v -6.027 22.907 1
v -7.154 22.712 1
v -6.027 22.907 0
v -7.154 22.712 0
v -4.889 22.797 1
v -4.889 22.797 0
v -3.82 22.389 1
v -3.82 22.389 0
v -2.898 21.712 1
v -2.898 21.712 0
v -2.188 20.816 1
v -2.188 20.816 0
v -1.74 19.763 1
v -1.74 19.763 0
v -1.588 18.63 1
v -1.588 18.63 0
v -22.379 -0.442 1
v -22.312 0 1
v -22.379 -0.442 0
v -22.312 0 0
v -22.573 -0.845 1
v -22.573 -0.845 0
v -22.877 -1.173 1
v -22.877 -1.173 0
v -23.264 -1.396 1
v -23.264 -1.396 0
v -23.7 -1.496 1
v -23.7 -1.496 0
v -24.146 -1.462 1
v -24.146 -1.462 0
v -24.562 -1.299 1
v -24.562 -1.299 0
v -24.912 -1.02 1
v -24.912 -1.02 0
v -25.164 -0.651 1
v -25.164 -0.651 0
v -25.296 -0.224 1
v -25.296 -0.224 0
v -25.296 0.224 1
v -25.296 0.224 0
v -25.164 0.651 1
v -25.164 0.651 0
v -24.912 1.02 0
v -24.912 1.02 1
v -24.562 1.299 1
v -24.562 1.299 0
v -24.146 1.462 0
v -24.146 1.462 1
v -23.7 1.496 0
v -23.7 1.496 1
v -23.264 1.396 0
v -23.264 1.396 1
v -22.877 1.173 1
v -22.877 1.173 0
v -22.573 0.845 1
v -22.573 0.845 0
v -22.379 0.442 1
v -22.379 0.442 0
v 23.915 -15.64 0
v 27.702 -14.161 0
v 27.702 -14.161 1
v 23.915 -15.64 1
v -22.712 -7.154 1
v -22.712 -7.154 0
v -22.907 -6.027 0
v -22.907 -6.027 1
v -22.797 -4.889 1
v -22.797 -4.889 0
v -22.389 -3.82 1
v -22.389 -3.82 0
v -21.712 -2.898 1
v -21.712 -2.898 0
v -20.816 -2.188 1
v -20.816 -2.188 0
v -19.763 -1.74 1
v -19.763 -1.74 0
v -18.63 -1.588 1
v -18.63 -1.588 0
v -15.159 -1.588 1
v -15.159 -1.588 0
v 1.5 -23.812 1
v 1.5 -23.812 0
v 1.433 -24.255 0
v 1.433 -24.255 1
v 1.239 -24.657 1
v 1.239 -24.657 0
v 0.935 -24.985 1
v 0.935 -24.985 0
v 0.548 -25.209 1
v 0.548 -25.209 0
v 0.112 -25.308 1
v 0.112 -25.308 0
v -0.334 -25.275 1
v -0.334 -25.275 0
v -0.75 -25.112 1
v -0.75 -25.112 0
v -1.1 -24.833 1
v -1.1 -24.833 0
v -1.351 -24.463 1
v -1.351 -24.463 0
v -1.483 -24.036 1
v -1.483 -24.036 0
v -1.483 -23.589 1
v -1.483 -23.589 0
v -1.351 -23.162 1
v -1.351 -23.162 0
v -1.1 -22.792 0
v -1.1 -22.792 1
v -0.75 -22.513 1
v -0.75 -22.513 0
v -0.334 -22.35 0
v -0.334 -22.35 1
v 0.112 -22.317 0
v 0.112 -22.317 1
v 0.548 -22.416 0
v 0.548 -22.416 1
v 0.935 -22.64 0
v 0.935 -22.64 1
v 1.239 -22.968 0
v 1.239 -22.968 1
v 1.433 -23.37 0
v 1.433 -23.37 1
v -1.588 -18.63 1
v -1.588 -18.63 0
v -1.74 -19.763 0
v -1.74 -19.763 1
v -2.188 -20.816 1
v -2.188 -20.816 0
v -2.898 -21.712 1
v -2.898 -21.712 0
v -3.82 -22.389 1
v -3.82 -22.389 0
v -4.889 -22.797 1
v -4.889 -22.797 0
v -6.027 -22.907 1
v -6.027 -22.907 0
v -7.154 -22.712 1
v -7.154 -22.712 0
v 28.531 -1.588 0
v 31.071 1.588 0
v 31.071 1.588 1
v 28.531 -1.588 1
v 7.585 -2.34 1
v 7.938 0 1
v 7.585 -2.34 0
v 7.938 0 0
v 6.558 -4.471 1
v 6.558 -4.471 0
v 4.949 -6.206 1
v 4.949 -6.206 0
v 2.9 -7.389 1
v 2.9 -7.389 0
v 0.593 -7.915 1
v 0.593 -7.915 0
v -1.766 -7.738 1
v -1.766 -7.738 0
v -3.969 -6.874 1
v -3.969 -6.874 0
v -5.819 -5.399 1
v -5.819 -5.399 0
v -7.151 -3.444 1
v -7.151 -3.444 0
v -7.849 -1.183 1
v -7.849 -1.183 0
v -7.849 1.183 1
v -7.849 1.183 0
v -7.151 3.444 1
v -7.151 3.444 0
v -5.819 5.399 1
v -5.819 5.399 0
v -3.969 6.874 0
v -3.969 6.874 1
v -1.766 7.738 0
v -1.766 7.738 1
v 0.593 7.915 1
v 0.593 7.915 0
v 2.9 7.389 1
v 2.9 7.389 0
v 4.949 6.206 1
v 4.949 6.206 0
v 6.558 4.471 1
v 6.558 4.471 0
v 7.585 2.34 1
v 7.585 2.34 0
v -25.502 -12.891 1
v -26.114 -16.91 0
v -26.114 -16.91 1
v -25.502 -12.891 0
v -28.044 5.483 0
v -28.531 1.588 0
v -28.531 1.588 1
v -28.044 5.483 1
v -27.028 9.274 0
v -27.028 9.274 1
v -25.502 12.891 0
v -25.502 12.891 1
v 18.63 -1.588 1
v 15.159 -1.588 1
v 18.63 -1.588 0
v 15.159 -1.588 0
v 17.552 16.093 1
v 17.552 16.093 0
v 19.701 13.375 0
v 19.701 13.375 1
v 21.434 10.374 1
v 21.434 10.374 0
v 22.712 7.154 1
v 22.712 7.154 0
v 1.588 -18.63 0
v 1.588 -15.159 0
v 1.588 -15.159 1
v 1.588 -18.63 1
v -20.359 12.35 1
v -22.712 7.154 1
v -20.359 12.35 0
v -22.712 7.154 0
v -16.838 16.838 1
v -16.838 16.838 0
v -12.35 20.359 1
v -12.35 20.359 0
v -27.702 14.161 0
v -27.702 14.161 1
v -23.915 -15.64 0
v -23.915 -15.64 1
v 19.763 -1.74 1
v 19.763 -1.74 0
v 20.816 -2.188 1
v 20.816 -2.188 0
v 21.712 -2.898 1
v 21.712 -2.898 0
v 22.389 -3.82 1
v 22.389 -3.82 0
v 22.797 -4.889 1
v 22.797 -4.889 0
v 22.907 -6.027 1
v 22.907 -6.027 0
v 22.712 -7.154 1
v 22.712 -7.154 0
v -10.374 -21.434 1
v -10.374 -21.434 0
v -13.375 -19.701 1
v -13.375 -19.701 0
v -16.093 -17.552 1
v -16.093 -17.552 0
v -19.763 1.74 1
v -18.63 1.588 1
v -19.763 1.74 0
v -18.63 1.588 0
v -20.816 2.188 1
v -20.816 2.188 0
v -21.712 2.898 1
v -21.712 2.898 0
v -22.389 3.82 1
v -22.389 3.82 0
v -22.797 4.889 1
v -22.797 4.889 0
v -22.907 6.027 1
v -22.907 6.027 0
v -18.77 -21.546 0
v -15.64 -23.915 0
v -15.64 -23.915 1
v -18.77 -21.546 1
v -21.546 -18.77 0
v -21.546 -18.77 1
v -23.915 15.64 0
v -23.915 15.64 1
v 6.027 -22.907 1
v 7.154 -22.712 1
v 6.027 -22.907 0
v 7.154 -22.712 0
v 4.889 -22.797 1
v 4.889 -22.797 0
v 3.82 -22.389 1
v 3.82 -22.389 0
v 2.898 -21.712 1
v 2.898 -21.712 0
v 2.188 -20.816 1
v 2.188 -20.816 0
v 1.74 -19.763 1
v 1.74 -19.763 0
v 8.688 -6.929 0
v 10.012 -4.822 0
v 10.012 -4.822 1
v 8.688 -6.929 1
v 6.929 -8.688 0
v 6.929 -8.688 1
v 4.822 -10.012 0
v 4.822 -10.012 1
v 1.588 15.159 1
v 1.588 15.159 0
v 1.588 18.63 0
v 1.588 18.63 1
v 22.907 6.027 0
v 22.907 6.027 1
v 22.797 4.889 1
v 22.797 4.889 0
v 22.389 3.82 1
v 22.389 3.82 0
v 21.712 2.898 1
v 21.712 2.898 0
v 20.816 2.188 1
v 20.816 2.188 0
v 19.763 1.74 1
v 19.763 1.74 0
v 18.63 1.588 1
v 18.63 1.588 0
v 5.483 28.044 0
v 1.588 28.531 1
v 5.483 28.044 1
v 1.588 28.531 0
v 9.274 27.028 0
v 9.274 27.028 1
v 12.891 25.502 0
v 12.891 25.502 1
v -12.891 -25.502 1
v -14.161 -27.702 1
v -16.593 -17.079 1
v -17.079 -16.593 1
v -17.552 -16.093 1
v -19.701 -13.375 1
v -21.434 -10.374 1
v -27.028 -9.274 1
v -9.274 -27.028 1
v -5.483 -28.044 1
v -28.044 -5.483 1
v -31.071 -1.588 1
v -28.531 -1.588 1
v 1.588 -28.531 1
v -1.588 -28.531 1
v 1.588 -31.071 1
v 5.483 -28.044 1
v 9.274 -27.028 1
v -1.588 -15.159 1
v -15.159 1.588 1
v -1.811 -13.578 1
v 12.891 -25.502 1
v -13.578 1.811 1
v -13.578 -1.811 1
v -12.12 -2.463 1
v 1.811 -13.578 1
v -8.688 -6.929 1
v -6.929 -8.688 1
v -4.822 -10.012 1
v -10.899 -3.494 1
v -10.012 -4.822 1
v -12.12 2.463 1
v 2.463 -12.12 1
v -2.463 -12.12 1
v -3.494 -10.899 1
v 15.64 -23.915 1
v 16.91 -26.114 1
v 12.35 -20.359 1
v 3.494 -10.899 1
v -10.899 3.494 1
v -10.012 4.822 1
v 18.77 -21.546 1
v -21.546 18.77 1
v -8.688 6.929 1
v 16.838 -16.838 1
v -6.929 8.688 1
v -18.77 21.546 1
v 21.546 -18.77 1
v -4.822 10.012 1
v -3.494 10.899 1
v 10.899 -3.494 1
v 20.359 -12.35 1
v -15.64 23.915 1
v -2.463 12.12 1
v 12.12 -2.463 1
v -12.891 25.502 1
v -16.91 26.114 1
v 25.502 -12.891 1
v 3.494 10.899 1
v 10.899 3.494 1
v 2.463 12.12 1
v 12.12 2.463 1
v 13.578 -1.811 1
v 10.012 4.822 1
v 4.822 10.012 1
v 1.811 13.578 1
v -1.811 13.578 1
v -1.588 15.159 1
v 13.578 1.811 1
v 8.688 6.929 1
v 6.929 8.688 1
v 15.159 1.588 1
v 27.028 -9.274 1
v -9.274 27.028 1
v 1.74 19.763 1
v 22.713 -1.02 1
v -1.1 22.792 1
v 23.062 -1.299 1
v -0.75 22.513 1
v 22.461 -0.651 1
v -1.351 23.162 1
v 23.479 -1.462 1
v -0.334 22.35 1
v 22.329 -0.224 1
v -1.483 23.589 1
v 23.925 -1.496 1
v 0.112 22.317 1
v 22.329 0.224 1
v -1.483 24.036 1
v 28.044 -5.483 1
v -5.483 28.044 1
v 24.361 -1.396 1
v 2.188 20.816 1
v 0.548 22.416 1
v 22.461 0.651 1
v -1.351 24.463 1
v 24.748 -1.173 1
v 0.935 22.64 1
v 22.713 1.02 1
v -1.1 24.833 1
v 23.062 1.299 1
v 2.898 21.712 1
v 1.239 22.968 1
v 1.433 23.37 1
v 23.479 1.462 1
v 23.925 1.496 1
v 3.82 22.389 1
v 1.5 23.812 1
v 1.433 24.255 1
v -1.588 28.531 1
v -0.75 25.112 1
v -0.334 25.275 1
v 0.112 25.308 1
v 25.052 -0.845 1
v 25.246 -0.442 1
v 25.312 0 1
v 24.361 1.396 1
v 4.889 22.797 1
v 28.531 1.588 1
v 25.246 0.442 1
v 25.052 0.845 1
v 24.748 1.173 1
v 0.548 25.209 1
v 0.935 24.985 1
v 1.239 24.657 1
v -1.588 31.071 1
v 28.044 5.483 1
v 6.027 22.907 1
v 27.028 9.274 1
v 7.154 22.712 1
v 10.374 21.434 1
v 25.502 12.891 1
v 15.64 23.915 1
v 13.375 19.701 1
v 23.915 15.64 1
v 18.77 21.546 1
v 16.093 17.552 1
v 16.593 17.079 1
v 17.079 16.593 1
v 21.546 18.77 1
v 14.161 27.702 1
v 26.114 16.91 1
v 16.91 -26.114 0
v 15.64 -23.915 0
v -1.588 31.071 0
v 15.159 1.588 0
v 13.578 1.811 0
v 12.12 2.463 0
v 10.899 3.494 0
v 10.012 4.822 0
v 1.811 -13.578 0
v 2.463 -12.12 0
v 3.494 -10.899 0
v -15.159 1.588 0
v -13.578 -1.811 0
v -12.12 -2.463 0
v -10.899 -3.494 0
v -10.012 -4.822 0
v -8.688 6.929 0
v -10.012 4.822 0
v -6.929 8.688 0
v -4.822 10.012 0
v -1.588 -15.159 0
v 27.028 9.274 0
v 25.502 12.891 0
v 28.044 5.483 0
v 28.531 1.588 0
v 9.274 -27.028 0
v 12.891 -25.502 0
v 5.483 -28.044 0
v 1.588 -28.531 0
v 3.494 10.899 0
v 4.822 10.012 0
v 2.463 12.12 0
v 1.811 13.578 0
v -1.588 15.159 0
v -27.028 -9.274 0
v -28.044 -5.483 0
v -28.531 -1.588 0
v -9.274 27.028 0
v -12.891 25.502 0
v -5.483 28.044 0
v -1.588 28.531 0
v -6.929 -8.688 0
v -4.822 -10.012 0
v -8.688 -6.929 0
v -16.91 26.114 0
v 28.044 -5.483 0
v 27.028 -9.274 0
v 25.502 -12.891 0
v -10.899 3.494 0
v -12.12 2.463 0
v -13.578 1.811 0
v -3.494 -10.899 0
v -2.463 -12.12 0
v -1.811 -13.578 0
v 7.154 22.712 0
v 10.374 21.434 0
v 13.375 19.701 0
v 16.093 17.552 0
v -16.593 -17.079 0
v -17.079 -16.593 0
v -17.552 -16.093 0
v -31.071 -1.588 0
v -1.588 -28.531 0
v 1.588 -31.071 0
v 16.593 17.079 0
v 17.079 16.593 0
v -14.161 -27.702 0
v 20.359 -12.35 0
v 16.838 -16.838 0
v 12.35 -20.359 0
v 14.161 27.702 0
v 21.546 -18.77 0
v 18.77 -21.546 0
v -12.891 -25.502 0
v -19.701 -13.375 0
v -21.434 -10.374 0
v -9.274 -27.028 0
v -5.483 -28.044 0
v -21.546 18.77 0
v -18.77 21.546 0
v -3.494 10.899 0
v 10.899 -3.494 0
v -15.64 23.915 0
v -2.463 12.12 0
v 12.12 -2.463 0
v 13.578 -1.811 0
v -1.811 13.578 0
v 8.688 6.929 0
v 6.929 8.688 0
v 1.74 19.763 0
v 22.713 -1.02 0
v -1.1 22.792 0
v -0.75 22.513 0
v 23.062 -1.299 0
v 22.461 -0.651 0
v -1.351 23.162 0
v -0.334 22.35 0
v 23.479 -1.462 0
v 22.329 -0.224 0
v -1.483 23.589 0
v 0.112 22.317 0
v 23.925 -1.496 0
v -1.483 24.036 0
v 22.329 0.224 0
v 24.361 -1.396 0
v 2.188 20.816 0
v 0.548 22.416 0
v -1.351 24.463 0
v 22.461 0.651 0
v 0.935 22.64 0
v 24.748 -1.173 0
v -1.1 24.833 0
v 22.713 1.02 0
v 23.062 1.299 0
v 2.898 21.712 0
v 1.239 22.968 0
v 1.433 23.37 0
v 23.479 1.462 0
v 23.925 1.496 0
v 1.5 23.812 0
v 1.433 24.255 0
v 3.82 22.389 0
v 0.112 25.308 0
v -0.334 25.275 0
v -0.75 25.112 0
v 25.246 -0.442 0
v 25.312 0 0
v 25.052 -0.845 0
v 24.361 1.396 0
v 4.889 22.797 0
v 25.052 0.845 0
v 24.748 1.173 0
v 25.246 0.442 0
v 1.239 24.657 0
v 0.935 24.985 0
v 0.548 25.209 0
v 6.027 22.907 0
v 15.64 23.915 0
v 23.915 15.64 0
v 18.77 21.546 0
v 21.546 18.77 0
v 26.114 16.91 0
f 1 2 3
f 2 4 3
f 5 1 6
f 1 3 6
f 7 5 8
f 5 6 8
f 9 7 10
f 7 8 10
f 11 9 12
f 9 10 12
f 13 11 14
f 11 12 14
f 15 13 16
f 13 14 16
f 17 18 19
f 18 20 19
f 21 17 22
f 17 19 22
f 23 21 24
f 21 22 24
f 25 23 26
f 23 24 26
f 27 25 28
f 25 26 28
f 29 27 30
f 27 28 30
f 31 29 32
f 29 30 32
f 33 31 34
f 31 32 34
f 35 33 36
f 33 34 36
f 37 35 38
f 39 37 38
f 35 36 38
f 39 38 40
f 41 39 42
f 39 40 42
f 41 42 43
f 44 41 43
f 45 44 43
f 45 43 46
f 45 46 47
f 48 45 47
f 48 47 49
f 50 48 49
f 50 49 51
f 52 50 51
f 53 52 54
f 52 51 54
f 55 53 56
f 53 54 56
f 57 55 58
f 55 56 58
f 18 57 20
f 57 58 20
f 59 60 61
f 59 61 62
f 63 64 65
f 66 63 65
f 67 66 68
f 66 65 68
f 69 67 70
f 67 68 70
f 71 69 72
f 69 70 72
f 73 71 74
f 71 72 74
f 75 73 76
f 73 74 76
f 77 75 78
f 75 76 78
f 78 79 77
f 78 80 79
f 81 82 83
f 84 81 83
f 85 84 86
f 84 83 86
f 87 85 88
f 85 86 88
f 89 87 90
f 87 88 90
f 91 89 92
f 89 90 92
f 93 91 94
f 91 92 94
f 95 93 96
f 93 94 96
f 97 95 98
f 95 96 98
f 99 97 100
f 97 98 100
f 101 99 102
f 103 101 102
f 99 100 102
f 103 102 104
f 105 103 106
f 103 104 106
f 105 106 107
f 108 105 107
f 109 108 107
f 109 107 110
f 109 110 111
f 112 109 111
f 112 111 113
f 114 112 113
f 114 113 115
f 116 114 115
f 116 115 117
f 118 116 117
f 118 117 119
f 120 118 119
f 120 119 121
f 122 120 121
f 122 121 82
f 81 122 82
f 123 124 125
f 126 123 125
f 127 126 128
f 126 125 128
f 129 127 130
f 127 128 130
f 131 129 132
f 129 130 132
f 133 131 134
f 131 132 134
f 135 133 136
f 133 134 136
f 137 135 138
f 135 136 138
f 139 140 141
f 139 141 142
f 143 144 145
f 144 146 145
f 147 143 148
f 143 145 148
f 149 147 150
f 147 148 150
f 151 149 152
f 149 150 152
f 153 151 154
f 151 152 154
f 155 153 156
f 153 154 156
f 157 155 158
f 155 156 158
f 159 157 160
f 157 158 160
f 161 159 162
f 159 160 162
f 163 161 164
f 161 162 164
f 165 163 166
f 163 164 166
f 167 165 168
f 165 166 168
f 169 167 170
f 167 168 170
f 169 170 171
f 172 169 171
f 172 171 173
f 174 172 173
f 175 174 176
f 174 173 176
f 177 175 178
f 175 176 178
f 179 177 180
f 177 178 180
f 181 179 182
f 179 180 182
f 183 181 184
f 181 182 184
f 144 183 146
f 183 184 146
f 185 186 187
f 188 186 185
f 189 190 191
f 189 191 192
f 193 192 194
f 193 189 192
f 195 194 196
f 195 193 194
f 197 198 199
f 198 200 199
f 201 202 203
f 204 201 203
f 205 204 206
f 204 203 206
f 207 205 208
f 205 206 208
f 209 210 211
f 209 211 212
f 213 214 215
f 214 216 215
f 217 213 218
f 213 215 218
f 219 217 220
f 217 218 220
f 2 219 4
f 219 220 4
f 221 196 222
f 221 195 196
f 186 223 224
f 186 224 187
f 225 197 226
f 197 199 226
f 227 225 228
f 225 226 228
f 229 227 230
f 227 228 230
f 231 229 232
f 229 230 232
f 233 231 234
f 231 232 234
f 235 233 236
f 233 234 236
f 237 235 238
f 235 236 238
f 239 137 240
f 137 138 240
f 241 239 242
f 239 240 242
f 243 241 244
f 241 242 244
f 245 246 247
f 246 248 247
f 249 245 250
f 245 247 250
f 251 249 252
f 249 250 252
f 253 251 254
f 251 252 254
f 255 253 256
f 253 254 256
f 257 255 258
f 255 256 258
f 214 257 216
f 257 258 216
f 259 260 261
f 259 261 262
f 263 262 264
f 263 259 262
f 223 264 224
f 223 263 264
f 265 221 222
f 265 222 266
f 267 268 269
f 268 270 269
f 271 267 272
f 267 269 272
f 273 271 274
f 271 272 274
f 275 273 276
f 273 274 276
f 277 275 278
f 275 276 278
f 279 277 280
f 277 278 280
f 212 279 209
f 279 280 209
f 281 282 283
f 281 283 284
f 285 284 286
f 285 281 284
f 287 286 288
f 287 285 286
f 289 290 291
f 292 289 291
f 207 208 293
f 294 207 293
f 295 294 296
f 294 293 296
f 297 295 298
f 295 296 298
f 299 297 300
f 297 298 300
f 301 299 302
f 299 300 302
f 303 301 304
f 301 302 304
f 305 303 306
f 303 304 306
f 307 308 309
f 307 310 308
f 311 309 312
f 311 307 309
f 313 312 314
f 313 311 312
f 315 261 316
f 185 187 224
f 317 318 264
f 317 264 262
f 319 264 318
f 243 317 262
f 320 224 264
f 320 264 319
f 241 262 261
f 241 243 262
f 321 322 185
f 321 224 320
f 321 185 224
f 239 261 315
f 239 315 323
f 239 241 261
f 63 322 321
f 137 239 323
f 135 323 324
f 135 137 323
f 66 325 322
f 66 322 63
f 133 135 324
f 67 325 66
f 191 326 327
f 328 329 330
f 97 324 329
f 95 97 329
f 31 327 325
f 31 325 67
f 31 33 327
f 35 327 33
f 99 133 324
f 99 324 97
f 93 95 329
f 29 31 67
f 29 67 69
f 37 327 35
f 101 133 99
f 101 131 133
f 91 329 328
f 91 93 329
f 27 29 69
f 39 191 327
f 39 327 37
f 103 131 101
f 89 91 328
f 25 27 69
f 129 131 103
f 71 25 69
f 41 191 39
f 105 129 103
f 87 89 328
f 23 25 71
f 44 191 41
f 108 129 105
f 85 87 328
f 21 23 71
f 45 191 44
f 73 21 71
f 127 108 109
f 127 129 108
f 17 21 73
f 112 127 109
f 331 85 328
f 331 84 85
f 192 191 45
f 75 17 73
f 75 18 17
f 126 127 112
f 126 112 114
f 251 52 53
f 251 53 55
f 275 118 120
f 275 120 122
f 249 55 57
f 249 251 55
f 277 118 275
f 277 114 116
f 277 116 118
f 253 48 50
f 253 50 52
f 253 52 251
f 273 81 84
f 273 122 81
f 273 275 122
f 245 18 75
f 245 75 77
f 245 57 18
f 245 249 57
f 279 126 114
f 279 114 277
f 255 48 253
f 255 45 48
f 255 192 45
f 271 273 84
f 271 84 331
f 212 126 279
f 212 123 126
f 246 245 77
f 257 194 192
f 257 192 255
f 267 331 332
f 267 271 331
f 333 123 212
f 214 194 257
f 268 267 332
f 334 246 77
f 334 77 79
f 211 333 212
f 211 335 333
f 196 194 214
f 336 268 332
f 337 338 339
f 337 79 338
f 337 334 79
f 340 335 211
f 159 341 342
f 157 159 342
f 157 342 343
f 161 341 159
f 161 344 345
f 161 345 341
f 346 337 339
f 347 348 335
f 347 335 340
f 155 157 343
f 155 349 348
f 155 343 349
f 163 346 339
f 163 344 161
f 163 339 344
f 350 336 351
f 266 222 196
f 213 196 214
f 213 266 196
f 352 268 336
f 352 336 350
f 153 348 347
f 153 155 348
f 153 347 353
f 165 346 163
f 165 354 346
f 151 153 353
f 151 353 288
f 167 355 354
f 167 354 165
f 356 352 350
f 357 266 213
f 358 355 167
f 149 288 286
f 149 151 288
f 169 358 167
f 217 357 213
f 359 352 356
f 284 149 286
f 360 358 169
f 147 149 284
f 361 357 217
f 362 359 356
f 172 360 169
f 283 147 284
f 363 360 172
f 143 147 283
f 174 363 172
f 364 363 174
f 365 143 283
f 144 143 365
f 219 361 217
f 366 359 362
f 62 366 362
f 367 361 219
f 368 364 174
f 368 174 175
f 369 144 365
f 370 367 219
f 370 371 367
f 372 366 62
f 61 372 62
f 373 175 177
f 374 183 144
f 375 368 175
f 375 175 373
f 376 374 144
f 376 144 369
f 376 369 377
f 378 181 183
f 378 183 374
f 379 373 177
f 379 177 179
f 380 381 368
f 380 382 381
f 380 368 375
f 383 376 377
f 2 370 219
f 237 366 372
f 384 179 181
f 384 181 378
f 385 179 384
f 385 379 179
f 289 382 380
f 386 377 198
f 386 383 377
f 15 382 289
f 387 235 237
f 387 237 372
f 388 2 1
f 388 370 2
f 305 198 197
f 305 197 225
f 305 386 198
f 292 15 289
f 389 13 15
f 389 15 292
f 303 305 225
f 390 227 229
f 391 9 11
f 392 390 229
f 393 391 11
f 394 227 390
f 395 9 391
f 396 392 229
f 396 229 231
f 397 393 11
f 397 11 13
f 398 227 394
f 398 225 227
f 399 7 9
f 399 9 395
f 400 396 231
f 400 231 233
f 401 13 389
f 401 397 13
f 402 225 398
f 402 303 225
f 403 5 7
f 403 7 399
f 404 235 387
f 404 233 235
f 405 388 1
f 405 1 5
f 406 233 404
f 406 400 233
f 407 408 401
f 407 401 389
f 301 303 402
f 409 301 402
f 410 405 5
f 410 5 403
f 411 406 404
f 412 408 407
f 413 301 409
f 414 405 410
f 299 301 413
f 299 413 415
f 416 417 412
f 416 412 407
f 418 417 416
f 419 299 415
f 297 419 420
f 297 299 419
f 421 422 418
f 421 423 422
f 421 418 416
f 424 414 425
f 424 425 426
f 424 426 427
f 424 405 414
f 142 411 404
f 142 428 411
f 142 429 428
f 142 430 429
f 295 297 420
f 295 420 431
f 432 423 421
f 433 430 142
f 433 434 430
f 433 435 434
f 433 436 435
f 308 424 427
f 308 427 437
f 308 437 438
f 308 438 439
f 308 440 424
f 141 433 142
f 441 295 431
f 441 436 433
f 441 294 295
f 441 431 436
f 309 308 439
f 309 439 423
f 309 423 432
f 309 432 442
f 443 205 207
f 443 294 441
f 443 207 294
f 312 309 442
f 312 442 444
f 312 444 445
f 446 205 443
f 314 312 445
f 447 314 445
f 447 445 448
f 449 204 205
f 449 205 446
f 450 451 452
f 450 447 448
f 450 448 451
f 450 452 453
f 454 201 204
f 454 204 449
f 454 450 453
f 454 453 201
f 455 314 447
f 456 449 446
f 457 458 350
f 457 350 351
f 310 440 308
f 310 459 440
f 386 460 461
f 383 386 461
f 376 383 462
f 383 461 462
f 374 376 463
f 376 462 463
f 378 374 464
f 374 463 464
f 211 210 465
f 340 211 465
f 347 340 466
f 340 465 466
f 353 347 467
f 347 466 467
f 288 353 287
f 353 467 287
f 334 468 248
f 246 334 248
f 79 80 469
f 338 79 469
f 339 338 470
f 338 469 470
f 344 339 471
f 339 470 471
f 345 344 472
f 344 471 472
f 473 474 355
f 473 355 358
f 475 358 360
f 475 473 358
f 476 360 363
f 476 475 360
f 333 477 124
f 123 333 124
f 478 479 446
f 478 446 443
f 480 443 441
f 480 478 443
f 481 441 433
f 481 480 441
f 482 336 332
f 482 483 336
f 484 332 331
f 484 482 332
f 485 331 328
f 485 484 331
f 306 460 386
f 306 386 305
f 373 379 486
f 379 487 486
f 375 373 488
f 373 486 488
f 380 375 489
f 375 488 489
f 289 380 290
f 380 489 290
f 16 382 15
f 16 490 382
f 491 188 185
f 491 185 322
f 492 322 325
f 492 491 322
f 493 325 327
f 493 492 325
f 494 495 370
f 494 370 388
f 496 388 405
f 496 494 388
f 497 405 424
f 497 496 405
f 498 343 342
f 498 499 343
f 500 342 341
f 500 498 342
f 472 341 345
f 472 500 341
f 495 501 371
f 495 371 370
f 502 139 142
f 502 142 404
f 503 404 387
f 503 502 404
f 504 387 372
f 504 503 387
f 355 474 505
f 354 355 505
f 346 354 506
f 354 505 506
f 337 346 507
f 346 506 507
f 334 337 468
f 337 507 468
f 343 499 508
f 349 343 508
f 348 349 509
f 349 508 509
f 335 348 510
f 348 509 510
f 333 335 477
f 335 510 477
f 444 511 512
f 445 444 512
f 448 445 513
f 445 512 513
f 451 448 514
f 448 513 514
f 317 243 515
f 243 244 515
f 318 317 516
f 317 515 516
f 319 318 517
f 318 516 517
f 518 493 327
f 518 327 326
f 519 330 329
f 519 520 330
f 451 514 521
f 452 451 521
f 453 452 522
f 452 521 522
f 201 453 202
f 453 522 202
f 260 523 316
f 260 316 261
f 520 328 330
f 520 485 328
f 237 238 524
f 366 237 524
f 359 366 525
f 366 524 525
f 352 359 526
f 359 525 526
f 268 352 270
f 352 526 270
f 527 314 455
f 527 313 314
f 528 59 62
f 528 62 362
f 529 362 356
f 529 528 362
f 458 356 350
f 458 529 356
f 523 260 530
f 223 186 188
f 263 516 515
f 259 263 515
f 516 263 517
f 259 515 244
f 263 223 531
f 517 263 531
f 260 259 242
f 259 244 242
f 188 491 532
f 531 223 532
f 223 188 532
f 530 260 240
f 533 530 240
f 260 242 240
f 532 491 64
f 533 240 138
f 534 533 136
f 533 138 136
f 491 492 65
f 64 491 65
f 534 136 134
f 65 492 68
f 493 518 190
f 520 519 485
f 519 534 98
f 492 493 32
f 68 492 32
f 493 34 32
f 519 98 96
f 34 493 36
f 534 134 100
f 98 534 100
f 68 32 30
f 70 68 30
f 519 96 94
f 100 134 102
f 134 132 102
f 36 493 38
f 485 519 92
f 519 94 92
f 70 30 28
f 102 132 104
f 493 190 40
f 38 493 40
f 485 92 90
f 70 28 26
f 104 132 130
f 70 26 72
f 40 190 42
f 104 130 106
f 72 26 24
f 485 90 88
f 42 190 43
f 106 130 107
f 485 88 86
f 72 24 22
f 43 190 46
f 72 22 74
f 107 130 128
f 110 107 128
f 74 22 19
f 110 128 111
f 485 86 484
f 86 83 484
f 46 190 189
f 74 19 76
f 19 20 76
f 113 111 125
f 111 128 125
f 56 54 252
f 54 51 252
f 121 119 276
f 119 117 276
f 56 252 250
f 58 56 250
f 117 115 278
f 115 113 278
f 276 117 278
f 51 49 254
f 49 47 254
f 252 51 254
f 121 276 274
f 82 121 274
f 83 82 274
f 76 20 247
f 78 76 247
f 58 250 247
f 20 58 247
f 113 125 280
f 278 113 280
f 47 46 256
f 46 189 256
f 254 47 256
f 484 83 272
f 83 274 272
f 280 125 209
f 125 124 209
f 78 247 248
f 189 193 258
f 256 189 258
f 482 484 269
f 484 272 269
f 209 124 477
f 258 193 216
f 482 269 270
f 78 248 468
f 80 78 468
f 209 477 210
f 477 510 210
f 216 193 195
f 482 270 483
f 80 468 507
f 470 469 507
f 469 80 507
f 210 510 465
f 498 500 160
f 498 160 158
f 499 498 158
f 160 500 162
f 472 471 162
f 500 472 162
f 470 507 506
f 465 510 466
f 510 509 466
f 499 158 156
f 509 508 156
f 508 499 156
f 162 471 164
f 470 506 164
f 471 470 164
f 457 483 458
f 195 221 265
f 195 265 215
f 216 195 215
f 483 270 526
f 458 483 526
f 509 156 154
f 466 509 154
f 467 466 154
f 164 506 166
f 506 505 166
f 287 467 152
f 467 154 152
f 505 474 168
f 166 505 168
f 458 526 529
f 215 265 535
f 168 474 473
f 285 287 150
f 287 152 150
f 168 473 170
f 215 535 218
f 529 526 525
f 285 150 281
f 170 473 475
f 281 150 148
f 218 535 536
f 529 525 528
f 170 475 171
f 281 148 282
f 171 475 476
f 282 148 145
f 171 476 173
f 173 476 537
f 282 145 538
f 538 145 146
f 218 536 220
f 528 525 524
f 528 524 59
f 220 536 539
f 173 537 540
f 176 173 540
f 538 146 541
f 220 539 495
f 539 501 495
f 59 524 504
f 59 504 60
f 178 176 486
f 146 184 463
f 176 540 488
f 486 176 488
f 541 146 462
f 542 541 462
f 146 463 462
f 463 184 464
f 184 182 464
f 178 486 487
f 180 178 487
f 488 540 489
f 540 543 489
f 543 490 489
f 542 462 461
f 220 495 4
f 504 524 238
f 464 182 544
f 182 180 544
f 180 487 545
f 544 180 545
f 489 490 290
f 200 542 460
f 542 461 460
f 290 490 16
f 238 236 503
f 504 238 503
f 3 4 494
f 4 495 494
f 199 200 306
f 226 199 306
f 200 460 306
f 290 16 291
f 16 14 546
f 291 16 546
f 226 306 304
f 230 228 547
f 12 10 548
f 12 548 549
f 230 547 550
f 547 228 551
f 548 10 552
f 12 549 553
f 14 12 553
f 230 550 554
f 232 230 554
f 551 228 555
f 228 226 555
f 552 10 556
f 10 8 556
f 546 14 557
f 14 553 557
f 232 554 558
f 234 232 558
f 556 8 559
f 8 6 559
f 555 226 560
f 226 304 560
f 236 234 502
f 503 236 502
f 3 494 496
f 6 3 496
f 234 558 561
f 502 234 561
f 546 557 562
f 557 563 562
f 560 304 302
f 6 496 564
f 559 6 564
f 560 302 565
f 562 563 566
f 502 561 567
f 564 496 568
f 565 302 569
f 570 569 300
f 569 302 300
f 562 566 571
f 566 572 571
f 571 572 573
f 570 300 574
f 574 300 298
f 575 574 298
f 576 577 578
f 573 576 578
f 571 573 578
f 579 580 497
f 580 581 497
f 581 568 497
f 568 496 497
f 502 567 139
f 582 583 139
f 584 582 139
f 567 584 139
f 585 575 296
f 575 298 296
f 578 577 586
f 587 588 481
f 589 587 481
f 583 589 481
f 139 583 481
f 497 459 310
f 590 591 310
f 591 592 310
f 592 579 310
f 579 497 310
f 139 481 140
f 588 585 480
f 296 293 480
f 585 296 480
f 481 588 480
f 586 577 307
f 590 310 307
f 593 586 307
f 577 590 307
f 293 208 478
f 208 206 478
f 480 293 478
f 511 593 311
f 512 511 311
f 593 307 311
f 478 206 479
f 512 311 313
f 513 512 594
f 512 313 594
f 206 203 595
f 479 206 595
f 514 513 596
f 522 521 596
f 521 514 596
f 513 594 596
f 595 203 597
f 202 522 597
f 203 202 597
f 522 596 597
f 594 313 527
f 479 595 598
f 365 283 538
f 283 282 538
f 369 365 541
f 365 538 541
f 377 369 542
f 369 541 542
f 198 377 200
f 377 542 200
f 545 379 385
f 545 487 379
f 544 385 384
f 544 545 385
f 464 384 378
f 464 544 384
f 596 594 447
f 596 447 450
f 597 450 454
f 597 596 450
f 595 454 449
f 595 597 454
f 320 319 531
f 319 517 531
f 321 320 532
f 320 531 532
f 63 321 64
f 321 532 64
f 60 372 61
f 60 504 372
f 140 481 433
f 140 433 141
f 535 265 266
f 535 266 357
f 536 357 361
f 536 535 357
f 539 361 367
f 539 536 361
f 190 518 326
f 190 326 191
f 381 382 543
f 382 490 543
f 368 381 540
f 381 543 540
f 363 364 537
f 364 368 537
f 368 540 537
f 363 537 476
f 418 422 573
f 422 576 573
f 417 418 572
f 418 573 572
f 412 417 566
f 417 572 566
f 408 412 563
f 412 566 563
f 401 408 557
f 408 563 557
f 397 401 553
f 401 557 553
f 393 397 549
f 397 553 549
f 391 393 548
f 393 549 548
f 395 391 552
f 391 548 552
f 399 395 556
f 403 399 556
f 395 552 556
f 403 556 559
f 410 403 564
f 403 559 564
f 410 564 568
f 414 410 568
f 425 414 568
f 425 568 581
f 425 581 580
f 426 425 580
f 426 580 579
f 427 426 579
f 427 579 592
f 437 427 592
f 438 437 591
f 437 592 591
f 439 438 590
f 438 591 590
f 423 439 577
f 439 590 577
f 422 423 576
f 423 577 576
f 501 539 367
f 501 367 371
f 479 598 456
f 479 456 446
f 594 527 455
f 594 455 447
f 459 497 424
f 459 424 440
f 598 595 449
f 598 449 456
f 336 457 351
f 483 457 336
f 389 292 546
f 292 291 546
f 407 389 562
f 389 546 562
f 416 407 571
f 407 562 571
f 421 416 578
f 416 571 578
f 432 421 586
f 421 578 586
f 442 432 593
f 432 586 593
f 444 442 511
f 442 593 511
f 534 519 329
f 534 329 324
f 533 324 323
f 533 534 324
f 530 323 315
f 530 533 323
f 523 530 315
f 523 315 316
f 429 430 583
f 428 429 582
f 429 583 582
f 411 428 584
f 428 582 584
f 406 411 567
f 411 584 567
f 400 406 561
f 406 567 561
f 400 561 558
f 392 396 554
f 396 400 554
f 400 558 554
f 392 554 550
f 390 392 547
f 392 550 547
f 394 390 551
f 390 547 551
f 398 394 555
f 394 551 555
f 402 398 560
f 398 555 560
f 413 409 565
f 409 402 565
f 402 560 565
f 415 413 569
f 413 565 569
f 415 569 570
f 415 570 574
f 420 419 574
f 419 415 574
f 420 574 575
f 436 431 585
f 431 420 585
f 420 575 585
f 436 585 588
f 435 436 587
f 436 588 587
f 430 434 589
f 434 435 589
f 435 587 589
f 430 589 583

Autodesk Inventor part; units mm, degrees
ref_plane "YZ Plane" through (0, 0, 0) normal (1, 0, 0) x (0, 1, 0)
ref_plane "XZ Plane" through (0, 0, 0) normal (0, 1, 0) x (-1, 0, 0)
ref_plane "XY Plane" through (0, 0, 0) normal (0, 0, 1) x (1, 0, 0)
sketch "Sketch1" plane through (0, 0, 0) normal (0, 0, 1) x (1, 0, 0)
  circle A0 centre (0, 0) radius 28.575
  circle A1 centre (0, 0) radius 23.8125 construction
  circle A2 centre (0, 0) radius 11.1125
  line L0 (0, 0) -> (0, 28.575) construction
  circle A3 centre (0, 23.8125) radius 1.5
  line L1 (-1.5875, 10.9985) -> (-1.5875, 28.5309)
  line L2 (1.5875, 10.9985) -> (1.5875, 28.5309)
  arc A4 (7.1541, 22.7124) -> (1.5875, 18.6296) centre (5.868, 18.6296) ccw
  arc A5 (-1.5875, 18.6296) -> (-7.1541, 22.7124) centre (-5.868, 18.6296) ccw
  arc A6 (1.5875, 15.1594) -> (4.8218, 10.0119) centre (7.3009, 15.1594) ccw
  arc A7 (-4.8218, 10.0119) -> (-1.5875, 15.1594) centre (-7.3009, 15.1594) ccw
  arc A8 (-15.1594, 1.5875) -> (-10.0119, 4.8218) centre (-15.1594, 7.3009) ccw
  line L3 (-10.9985, 1.5875) -> (-28.5309, 1.5875)
  line L4 (-10.9985, -1.5875) -> (-28.5309, -1.5875)
  arc A9 (-10.0119, -4.8218) -> (-15.1594, -1.5875) centre (-15.1594, -7.3009) ccw
  arc A10 (-22.7124, 7.1541) -> (-18.6296, 1.5875) centre (-18.6296, 5.868) ccw
  arc A11 (-18.6296, -1.5875) -> (-22.7124, -7.1541) centre (-18.6296, -5.868) ccw
  circle A12 centre (-23.8125, 0) radius 1.5
  arc A13 (-1.5875, -15.1594) -> (-4.8218, -10.0119) centre (-7.3009, -15.1594) ccw
  line L5 (-1.5875, -10.9985) -> (-1.5875, -28.5309)
  line L6 (1.5875, -10.9985) -> (1.5875, -28.5309)
  arc A14 (4.8218, -10.0119) -> (1.5875, -15.1594) centre (7.3009, -15.1594) ccw
  arc A15 (-7.1541, -22.7124) -> (-1.5875, -18.6296) centre (-5.868, -18.6296) ccw
  arc A16 (1.5875, -18.6296) -> (7.1541, -22.7124) centre (5.868, -18.6296) ccw
  circle A17 centre (0, -23.8125) radius 1.5
  arc A18 (15.1594, -1.5875) -> (10.0119, -4.8218) centre (15.1594, -7.3009) ccw
  line L7 (10.9985, -1.5875) -> (28.5309, -1.5875)
  line L8 (10.9985, 1.5875) -> (28.5309, 1.5875)
  arc A19 (10.0119, 4.8218) -> (15.1594, 1.5875) centre (15.1594, 7.3009) ccw
  arc A20 (22.7124, -7.1541) -> (18.6296, -1.5875) centre (18.6296, -5.868) ccw
  arc A21 (18.6296, 1.5875) -> (22.7124, 7.1541) centre (18.6296, 5.868) ccw
  circle A22 centre (23.8125, 0) radius 1.5
  circle A23 centre (0, 0) radius 7.9375
  arc A24 (-7.1541, 22.7124) -> (-22.7124, 7.1541) centre (0, 0) ccw
  arc A25 (-23.2466, 5.1606) -> (-17.5518, -16.0925) centre (0, 0) ccw
  arc A26 (-16.0925, -17.5518) -> (5.1606, -23.2466) centre (0, 0) ccw
  arc A27 (7.1541, -22.7124) -> (22.7124, -7.1541) centre (0, 0) ccw
  arc A28 (23.2466, -5.1606) -> (17.5518, 16.0925) centre (0, 0) ccw
  arc A29 (16.0925, 17.5518) -> (-5.1606, 23.2466) centre (0, 0) ccw
  line L9 (-1.5875, 28.5309) -> (-1.5875, 31.0709)
  line L10 (-1.5875, 31.0709) -> (1.5875, 28.5309)
  line L11 (-16.9102, 26.1144) -> (-12.8906, 25.5022)
  line L12 (-15.6402, 23.9147) -> (-16.9102, 26.1144)
  line L13 (-27.7019, 14.1606) -> (-23.9147, 15.6402)
  line L14 (-25.5022, 12.8906) -> (-27.7019, 14.1606)
  line L15 (-31.0709, -1.5875) -> (-28.5309, 1.5875)
  line L16 (-28.5309, -1.5875) -> (-31.0709, -1.5875)
  line L17 (-26.1144, -16.9102) -> (-25.5022, -12.8906)
  line L18 (-23.9147, -15.6402) -> (-26.1144, -16.9102)
  line L19 (-14.1606, -27.7019) -> (-15.6402, -23.9147)
  line L20 (-12.8906, -25.5022) -> (-14.1606, -27.7019)
  line L21 (1.5875, -31.0709) -> (-1.5875, -28.5309)
  line L22 (1.5875, -28.5309) -> (1.5875, -31.0709)
  line L23 (16.9102, -26.1144) -> (12.8906, -25.5022)
  line L24 (15.6402, -23.9147) -> (16.9102, -26.1144)
  line L25 (27.7019, -14.1606) -> (23.9147, -15.6402)
  line L26 (25.5022, -12.8906) -> (27.7019, -14.1606)
  line L27 (31.0709, 1.5875) -> (28.5309, -1.5875)
  line L28 (28.5309, 1.5875) -> (31.0709, 1.5875)
  line L29 (26.1144, 16.9102) -> (25.5022, 12.8906)
  line L30 (23.9147, 15.6402) -> (26.1144, 16.9102)
  line L31 (14.1606, 27.7019) -> (15.6402, 23.9147)
  line L32 (12.8906, 25.5022) -> (14.1606, 27.7019)
  arc A30 (-22.7124, -7.1541) -> (-7.1541, -22.7124) centre (0, 0) ccw
  arc A31 (7.1541, -22.7124) -> (22.7124, -7.1541) centre (0, 0) ccw
  arc A32 (23.0011, 6.1631) -> (7.1541, 22.7124) centre (0, 0) ccw
  arc A33 (-7.1541, 22.7124) -> (-22.7124, 7.1541) centre (0, 0) ccw
  point P0 (-1.5875, 15.1594)
  point P1 (-4.8218, 10.0119)
  point P2 (-10.0119, 4.8218)
  point P3 (-1.5875, 18.6296)
  point P4 (1.5875, -15.1594)
  point P5 (4.8218, -10.0119)
  point P6 (10.0119, -4.8218)
  point P7 (-7.072, -22.7381)
  point P8 (-16.1558, -17.4936)
  point P9 (1.5875, -18.6296)
  point P10 (-28.5309, 1.5875)
  point P11 (-23.9147, -15.6402)
  point P12 (-1.5875, -28.5309)
  point P13 (1.5875, -28.5309)
  point P14 (23.9147, -15.6402)
  point P15 (25.5022, -12.8906)
  point P16 (25.5022, 12.8906)
  point P17 (23.9147, 15.6402)
  point P18 (15.1594, 1.5875)
  point P19 (7.072, -22.7381)
  point P20 (18.6296, 1.5875)
  point P21 (-15.1594, -1.5875)
  point P22 (-10.0119, -4.8218)
  point P23 (-4.8218, -10.0119)
  point P24 (-23.2278, -5.2445)
  point P25 (-22.7124, -7.1541)
  point P26 (-18.6296, -1.5875)
  point P27 (7.1541, 22.7124)
  point P28 (-23.7595, -1.5875)
  point P29 (16.0925, 17.5518)
  point P30 (17.5518, 16.0925)
  point P31 (22.7124, 7.1541)
  point P32 (-7.1541, -22.7124)
  point P33 (-16.0925, -17.5518)
  point P34 (-17.5518, -16.0925)
  point P35 (22.7124, -7.1541)
  point P36 (7.1541, -22.7124)
  dimension "d0" = 57.15
  dimension "d1" = 47.625
  dimension "d2" = 22.225
  dimension "d3" = 3
  dimension "d4" = 1.5875
  dimension "d5" = 1.5875
  dimension "d8" = 360
  dimension "d10" = 15.875
  dimension "d13" = 360
  dimension "d15" = 2.54
  dimension "d18" = 360
extrude "Extrusion1" add sketch "Sketch1" along normal blind 1 contours A0 L7 A28 A22 L8 | A0 L28 L27 | L8 A28 A32 A29 L2 A0 | A0 L6 A16 A27 A20 L7 | A0 L30 L29 | A28 A22 L7 A2 L8 | L8 A21 A28 | L26 L25 A0 | A0 L32 L31 | L8 A2 A19 | L24 L23 A0 | A18 A2 L7 | A2 | L2 A29 A3 L1 A0 | A0 L9 L10 | A2 L2 A6 | L22 L21 A0 | A0 L5 A26 A17 L6 | A14 L6 A2 | L6 A26 A17 L5 A2 | L1 A5 A24 A10 L3 A0 | A29 A4 L2 | L2 A2 L1 A29 A3 | A0 L4 A25 A30 A26 L5 | A0 L12 L11 | A2 A7 L1 | L20 L19 A0 | A26 A15 L5 | L5 A13 A2 | A0 L14 L13 | A2 L3 A8 | L18 L17 A0 | A9 L4 A2 | A2 L4 A25 A12 L3 | L3 A25 A12 L4 A0 | A0 L16 L15 | A25 L4 A11
properties part number "Wood Magnets  (UNI) V1.0." material "Titanium"
